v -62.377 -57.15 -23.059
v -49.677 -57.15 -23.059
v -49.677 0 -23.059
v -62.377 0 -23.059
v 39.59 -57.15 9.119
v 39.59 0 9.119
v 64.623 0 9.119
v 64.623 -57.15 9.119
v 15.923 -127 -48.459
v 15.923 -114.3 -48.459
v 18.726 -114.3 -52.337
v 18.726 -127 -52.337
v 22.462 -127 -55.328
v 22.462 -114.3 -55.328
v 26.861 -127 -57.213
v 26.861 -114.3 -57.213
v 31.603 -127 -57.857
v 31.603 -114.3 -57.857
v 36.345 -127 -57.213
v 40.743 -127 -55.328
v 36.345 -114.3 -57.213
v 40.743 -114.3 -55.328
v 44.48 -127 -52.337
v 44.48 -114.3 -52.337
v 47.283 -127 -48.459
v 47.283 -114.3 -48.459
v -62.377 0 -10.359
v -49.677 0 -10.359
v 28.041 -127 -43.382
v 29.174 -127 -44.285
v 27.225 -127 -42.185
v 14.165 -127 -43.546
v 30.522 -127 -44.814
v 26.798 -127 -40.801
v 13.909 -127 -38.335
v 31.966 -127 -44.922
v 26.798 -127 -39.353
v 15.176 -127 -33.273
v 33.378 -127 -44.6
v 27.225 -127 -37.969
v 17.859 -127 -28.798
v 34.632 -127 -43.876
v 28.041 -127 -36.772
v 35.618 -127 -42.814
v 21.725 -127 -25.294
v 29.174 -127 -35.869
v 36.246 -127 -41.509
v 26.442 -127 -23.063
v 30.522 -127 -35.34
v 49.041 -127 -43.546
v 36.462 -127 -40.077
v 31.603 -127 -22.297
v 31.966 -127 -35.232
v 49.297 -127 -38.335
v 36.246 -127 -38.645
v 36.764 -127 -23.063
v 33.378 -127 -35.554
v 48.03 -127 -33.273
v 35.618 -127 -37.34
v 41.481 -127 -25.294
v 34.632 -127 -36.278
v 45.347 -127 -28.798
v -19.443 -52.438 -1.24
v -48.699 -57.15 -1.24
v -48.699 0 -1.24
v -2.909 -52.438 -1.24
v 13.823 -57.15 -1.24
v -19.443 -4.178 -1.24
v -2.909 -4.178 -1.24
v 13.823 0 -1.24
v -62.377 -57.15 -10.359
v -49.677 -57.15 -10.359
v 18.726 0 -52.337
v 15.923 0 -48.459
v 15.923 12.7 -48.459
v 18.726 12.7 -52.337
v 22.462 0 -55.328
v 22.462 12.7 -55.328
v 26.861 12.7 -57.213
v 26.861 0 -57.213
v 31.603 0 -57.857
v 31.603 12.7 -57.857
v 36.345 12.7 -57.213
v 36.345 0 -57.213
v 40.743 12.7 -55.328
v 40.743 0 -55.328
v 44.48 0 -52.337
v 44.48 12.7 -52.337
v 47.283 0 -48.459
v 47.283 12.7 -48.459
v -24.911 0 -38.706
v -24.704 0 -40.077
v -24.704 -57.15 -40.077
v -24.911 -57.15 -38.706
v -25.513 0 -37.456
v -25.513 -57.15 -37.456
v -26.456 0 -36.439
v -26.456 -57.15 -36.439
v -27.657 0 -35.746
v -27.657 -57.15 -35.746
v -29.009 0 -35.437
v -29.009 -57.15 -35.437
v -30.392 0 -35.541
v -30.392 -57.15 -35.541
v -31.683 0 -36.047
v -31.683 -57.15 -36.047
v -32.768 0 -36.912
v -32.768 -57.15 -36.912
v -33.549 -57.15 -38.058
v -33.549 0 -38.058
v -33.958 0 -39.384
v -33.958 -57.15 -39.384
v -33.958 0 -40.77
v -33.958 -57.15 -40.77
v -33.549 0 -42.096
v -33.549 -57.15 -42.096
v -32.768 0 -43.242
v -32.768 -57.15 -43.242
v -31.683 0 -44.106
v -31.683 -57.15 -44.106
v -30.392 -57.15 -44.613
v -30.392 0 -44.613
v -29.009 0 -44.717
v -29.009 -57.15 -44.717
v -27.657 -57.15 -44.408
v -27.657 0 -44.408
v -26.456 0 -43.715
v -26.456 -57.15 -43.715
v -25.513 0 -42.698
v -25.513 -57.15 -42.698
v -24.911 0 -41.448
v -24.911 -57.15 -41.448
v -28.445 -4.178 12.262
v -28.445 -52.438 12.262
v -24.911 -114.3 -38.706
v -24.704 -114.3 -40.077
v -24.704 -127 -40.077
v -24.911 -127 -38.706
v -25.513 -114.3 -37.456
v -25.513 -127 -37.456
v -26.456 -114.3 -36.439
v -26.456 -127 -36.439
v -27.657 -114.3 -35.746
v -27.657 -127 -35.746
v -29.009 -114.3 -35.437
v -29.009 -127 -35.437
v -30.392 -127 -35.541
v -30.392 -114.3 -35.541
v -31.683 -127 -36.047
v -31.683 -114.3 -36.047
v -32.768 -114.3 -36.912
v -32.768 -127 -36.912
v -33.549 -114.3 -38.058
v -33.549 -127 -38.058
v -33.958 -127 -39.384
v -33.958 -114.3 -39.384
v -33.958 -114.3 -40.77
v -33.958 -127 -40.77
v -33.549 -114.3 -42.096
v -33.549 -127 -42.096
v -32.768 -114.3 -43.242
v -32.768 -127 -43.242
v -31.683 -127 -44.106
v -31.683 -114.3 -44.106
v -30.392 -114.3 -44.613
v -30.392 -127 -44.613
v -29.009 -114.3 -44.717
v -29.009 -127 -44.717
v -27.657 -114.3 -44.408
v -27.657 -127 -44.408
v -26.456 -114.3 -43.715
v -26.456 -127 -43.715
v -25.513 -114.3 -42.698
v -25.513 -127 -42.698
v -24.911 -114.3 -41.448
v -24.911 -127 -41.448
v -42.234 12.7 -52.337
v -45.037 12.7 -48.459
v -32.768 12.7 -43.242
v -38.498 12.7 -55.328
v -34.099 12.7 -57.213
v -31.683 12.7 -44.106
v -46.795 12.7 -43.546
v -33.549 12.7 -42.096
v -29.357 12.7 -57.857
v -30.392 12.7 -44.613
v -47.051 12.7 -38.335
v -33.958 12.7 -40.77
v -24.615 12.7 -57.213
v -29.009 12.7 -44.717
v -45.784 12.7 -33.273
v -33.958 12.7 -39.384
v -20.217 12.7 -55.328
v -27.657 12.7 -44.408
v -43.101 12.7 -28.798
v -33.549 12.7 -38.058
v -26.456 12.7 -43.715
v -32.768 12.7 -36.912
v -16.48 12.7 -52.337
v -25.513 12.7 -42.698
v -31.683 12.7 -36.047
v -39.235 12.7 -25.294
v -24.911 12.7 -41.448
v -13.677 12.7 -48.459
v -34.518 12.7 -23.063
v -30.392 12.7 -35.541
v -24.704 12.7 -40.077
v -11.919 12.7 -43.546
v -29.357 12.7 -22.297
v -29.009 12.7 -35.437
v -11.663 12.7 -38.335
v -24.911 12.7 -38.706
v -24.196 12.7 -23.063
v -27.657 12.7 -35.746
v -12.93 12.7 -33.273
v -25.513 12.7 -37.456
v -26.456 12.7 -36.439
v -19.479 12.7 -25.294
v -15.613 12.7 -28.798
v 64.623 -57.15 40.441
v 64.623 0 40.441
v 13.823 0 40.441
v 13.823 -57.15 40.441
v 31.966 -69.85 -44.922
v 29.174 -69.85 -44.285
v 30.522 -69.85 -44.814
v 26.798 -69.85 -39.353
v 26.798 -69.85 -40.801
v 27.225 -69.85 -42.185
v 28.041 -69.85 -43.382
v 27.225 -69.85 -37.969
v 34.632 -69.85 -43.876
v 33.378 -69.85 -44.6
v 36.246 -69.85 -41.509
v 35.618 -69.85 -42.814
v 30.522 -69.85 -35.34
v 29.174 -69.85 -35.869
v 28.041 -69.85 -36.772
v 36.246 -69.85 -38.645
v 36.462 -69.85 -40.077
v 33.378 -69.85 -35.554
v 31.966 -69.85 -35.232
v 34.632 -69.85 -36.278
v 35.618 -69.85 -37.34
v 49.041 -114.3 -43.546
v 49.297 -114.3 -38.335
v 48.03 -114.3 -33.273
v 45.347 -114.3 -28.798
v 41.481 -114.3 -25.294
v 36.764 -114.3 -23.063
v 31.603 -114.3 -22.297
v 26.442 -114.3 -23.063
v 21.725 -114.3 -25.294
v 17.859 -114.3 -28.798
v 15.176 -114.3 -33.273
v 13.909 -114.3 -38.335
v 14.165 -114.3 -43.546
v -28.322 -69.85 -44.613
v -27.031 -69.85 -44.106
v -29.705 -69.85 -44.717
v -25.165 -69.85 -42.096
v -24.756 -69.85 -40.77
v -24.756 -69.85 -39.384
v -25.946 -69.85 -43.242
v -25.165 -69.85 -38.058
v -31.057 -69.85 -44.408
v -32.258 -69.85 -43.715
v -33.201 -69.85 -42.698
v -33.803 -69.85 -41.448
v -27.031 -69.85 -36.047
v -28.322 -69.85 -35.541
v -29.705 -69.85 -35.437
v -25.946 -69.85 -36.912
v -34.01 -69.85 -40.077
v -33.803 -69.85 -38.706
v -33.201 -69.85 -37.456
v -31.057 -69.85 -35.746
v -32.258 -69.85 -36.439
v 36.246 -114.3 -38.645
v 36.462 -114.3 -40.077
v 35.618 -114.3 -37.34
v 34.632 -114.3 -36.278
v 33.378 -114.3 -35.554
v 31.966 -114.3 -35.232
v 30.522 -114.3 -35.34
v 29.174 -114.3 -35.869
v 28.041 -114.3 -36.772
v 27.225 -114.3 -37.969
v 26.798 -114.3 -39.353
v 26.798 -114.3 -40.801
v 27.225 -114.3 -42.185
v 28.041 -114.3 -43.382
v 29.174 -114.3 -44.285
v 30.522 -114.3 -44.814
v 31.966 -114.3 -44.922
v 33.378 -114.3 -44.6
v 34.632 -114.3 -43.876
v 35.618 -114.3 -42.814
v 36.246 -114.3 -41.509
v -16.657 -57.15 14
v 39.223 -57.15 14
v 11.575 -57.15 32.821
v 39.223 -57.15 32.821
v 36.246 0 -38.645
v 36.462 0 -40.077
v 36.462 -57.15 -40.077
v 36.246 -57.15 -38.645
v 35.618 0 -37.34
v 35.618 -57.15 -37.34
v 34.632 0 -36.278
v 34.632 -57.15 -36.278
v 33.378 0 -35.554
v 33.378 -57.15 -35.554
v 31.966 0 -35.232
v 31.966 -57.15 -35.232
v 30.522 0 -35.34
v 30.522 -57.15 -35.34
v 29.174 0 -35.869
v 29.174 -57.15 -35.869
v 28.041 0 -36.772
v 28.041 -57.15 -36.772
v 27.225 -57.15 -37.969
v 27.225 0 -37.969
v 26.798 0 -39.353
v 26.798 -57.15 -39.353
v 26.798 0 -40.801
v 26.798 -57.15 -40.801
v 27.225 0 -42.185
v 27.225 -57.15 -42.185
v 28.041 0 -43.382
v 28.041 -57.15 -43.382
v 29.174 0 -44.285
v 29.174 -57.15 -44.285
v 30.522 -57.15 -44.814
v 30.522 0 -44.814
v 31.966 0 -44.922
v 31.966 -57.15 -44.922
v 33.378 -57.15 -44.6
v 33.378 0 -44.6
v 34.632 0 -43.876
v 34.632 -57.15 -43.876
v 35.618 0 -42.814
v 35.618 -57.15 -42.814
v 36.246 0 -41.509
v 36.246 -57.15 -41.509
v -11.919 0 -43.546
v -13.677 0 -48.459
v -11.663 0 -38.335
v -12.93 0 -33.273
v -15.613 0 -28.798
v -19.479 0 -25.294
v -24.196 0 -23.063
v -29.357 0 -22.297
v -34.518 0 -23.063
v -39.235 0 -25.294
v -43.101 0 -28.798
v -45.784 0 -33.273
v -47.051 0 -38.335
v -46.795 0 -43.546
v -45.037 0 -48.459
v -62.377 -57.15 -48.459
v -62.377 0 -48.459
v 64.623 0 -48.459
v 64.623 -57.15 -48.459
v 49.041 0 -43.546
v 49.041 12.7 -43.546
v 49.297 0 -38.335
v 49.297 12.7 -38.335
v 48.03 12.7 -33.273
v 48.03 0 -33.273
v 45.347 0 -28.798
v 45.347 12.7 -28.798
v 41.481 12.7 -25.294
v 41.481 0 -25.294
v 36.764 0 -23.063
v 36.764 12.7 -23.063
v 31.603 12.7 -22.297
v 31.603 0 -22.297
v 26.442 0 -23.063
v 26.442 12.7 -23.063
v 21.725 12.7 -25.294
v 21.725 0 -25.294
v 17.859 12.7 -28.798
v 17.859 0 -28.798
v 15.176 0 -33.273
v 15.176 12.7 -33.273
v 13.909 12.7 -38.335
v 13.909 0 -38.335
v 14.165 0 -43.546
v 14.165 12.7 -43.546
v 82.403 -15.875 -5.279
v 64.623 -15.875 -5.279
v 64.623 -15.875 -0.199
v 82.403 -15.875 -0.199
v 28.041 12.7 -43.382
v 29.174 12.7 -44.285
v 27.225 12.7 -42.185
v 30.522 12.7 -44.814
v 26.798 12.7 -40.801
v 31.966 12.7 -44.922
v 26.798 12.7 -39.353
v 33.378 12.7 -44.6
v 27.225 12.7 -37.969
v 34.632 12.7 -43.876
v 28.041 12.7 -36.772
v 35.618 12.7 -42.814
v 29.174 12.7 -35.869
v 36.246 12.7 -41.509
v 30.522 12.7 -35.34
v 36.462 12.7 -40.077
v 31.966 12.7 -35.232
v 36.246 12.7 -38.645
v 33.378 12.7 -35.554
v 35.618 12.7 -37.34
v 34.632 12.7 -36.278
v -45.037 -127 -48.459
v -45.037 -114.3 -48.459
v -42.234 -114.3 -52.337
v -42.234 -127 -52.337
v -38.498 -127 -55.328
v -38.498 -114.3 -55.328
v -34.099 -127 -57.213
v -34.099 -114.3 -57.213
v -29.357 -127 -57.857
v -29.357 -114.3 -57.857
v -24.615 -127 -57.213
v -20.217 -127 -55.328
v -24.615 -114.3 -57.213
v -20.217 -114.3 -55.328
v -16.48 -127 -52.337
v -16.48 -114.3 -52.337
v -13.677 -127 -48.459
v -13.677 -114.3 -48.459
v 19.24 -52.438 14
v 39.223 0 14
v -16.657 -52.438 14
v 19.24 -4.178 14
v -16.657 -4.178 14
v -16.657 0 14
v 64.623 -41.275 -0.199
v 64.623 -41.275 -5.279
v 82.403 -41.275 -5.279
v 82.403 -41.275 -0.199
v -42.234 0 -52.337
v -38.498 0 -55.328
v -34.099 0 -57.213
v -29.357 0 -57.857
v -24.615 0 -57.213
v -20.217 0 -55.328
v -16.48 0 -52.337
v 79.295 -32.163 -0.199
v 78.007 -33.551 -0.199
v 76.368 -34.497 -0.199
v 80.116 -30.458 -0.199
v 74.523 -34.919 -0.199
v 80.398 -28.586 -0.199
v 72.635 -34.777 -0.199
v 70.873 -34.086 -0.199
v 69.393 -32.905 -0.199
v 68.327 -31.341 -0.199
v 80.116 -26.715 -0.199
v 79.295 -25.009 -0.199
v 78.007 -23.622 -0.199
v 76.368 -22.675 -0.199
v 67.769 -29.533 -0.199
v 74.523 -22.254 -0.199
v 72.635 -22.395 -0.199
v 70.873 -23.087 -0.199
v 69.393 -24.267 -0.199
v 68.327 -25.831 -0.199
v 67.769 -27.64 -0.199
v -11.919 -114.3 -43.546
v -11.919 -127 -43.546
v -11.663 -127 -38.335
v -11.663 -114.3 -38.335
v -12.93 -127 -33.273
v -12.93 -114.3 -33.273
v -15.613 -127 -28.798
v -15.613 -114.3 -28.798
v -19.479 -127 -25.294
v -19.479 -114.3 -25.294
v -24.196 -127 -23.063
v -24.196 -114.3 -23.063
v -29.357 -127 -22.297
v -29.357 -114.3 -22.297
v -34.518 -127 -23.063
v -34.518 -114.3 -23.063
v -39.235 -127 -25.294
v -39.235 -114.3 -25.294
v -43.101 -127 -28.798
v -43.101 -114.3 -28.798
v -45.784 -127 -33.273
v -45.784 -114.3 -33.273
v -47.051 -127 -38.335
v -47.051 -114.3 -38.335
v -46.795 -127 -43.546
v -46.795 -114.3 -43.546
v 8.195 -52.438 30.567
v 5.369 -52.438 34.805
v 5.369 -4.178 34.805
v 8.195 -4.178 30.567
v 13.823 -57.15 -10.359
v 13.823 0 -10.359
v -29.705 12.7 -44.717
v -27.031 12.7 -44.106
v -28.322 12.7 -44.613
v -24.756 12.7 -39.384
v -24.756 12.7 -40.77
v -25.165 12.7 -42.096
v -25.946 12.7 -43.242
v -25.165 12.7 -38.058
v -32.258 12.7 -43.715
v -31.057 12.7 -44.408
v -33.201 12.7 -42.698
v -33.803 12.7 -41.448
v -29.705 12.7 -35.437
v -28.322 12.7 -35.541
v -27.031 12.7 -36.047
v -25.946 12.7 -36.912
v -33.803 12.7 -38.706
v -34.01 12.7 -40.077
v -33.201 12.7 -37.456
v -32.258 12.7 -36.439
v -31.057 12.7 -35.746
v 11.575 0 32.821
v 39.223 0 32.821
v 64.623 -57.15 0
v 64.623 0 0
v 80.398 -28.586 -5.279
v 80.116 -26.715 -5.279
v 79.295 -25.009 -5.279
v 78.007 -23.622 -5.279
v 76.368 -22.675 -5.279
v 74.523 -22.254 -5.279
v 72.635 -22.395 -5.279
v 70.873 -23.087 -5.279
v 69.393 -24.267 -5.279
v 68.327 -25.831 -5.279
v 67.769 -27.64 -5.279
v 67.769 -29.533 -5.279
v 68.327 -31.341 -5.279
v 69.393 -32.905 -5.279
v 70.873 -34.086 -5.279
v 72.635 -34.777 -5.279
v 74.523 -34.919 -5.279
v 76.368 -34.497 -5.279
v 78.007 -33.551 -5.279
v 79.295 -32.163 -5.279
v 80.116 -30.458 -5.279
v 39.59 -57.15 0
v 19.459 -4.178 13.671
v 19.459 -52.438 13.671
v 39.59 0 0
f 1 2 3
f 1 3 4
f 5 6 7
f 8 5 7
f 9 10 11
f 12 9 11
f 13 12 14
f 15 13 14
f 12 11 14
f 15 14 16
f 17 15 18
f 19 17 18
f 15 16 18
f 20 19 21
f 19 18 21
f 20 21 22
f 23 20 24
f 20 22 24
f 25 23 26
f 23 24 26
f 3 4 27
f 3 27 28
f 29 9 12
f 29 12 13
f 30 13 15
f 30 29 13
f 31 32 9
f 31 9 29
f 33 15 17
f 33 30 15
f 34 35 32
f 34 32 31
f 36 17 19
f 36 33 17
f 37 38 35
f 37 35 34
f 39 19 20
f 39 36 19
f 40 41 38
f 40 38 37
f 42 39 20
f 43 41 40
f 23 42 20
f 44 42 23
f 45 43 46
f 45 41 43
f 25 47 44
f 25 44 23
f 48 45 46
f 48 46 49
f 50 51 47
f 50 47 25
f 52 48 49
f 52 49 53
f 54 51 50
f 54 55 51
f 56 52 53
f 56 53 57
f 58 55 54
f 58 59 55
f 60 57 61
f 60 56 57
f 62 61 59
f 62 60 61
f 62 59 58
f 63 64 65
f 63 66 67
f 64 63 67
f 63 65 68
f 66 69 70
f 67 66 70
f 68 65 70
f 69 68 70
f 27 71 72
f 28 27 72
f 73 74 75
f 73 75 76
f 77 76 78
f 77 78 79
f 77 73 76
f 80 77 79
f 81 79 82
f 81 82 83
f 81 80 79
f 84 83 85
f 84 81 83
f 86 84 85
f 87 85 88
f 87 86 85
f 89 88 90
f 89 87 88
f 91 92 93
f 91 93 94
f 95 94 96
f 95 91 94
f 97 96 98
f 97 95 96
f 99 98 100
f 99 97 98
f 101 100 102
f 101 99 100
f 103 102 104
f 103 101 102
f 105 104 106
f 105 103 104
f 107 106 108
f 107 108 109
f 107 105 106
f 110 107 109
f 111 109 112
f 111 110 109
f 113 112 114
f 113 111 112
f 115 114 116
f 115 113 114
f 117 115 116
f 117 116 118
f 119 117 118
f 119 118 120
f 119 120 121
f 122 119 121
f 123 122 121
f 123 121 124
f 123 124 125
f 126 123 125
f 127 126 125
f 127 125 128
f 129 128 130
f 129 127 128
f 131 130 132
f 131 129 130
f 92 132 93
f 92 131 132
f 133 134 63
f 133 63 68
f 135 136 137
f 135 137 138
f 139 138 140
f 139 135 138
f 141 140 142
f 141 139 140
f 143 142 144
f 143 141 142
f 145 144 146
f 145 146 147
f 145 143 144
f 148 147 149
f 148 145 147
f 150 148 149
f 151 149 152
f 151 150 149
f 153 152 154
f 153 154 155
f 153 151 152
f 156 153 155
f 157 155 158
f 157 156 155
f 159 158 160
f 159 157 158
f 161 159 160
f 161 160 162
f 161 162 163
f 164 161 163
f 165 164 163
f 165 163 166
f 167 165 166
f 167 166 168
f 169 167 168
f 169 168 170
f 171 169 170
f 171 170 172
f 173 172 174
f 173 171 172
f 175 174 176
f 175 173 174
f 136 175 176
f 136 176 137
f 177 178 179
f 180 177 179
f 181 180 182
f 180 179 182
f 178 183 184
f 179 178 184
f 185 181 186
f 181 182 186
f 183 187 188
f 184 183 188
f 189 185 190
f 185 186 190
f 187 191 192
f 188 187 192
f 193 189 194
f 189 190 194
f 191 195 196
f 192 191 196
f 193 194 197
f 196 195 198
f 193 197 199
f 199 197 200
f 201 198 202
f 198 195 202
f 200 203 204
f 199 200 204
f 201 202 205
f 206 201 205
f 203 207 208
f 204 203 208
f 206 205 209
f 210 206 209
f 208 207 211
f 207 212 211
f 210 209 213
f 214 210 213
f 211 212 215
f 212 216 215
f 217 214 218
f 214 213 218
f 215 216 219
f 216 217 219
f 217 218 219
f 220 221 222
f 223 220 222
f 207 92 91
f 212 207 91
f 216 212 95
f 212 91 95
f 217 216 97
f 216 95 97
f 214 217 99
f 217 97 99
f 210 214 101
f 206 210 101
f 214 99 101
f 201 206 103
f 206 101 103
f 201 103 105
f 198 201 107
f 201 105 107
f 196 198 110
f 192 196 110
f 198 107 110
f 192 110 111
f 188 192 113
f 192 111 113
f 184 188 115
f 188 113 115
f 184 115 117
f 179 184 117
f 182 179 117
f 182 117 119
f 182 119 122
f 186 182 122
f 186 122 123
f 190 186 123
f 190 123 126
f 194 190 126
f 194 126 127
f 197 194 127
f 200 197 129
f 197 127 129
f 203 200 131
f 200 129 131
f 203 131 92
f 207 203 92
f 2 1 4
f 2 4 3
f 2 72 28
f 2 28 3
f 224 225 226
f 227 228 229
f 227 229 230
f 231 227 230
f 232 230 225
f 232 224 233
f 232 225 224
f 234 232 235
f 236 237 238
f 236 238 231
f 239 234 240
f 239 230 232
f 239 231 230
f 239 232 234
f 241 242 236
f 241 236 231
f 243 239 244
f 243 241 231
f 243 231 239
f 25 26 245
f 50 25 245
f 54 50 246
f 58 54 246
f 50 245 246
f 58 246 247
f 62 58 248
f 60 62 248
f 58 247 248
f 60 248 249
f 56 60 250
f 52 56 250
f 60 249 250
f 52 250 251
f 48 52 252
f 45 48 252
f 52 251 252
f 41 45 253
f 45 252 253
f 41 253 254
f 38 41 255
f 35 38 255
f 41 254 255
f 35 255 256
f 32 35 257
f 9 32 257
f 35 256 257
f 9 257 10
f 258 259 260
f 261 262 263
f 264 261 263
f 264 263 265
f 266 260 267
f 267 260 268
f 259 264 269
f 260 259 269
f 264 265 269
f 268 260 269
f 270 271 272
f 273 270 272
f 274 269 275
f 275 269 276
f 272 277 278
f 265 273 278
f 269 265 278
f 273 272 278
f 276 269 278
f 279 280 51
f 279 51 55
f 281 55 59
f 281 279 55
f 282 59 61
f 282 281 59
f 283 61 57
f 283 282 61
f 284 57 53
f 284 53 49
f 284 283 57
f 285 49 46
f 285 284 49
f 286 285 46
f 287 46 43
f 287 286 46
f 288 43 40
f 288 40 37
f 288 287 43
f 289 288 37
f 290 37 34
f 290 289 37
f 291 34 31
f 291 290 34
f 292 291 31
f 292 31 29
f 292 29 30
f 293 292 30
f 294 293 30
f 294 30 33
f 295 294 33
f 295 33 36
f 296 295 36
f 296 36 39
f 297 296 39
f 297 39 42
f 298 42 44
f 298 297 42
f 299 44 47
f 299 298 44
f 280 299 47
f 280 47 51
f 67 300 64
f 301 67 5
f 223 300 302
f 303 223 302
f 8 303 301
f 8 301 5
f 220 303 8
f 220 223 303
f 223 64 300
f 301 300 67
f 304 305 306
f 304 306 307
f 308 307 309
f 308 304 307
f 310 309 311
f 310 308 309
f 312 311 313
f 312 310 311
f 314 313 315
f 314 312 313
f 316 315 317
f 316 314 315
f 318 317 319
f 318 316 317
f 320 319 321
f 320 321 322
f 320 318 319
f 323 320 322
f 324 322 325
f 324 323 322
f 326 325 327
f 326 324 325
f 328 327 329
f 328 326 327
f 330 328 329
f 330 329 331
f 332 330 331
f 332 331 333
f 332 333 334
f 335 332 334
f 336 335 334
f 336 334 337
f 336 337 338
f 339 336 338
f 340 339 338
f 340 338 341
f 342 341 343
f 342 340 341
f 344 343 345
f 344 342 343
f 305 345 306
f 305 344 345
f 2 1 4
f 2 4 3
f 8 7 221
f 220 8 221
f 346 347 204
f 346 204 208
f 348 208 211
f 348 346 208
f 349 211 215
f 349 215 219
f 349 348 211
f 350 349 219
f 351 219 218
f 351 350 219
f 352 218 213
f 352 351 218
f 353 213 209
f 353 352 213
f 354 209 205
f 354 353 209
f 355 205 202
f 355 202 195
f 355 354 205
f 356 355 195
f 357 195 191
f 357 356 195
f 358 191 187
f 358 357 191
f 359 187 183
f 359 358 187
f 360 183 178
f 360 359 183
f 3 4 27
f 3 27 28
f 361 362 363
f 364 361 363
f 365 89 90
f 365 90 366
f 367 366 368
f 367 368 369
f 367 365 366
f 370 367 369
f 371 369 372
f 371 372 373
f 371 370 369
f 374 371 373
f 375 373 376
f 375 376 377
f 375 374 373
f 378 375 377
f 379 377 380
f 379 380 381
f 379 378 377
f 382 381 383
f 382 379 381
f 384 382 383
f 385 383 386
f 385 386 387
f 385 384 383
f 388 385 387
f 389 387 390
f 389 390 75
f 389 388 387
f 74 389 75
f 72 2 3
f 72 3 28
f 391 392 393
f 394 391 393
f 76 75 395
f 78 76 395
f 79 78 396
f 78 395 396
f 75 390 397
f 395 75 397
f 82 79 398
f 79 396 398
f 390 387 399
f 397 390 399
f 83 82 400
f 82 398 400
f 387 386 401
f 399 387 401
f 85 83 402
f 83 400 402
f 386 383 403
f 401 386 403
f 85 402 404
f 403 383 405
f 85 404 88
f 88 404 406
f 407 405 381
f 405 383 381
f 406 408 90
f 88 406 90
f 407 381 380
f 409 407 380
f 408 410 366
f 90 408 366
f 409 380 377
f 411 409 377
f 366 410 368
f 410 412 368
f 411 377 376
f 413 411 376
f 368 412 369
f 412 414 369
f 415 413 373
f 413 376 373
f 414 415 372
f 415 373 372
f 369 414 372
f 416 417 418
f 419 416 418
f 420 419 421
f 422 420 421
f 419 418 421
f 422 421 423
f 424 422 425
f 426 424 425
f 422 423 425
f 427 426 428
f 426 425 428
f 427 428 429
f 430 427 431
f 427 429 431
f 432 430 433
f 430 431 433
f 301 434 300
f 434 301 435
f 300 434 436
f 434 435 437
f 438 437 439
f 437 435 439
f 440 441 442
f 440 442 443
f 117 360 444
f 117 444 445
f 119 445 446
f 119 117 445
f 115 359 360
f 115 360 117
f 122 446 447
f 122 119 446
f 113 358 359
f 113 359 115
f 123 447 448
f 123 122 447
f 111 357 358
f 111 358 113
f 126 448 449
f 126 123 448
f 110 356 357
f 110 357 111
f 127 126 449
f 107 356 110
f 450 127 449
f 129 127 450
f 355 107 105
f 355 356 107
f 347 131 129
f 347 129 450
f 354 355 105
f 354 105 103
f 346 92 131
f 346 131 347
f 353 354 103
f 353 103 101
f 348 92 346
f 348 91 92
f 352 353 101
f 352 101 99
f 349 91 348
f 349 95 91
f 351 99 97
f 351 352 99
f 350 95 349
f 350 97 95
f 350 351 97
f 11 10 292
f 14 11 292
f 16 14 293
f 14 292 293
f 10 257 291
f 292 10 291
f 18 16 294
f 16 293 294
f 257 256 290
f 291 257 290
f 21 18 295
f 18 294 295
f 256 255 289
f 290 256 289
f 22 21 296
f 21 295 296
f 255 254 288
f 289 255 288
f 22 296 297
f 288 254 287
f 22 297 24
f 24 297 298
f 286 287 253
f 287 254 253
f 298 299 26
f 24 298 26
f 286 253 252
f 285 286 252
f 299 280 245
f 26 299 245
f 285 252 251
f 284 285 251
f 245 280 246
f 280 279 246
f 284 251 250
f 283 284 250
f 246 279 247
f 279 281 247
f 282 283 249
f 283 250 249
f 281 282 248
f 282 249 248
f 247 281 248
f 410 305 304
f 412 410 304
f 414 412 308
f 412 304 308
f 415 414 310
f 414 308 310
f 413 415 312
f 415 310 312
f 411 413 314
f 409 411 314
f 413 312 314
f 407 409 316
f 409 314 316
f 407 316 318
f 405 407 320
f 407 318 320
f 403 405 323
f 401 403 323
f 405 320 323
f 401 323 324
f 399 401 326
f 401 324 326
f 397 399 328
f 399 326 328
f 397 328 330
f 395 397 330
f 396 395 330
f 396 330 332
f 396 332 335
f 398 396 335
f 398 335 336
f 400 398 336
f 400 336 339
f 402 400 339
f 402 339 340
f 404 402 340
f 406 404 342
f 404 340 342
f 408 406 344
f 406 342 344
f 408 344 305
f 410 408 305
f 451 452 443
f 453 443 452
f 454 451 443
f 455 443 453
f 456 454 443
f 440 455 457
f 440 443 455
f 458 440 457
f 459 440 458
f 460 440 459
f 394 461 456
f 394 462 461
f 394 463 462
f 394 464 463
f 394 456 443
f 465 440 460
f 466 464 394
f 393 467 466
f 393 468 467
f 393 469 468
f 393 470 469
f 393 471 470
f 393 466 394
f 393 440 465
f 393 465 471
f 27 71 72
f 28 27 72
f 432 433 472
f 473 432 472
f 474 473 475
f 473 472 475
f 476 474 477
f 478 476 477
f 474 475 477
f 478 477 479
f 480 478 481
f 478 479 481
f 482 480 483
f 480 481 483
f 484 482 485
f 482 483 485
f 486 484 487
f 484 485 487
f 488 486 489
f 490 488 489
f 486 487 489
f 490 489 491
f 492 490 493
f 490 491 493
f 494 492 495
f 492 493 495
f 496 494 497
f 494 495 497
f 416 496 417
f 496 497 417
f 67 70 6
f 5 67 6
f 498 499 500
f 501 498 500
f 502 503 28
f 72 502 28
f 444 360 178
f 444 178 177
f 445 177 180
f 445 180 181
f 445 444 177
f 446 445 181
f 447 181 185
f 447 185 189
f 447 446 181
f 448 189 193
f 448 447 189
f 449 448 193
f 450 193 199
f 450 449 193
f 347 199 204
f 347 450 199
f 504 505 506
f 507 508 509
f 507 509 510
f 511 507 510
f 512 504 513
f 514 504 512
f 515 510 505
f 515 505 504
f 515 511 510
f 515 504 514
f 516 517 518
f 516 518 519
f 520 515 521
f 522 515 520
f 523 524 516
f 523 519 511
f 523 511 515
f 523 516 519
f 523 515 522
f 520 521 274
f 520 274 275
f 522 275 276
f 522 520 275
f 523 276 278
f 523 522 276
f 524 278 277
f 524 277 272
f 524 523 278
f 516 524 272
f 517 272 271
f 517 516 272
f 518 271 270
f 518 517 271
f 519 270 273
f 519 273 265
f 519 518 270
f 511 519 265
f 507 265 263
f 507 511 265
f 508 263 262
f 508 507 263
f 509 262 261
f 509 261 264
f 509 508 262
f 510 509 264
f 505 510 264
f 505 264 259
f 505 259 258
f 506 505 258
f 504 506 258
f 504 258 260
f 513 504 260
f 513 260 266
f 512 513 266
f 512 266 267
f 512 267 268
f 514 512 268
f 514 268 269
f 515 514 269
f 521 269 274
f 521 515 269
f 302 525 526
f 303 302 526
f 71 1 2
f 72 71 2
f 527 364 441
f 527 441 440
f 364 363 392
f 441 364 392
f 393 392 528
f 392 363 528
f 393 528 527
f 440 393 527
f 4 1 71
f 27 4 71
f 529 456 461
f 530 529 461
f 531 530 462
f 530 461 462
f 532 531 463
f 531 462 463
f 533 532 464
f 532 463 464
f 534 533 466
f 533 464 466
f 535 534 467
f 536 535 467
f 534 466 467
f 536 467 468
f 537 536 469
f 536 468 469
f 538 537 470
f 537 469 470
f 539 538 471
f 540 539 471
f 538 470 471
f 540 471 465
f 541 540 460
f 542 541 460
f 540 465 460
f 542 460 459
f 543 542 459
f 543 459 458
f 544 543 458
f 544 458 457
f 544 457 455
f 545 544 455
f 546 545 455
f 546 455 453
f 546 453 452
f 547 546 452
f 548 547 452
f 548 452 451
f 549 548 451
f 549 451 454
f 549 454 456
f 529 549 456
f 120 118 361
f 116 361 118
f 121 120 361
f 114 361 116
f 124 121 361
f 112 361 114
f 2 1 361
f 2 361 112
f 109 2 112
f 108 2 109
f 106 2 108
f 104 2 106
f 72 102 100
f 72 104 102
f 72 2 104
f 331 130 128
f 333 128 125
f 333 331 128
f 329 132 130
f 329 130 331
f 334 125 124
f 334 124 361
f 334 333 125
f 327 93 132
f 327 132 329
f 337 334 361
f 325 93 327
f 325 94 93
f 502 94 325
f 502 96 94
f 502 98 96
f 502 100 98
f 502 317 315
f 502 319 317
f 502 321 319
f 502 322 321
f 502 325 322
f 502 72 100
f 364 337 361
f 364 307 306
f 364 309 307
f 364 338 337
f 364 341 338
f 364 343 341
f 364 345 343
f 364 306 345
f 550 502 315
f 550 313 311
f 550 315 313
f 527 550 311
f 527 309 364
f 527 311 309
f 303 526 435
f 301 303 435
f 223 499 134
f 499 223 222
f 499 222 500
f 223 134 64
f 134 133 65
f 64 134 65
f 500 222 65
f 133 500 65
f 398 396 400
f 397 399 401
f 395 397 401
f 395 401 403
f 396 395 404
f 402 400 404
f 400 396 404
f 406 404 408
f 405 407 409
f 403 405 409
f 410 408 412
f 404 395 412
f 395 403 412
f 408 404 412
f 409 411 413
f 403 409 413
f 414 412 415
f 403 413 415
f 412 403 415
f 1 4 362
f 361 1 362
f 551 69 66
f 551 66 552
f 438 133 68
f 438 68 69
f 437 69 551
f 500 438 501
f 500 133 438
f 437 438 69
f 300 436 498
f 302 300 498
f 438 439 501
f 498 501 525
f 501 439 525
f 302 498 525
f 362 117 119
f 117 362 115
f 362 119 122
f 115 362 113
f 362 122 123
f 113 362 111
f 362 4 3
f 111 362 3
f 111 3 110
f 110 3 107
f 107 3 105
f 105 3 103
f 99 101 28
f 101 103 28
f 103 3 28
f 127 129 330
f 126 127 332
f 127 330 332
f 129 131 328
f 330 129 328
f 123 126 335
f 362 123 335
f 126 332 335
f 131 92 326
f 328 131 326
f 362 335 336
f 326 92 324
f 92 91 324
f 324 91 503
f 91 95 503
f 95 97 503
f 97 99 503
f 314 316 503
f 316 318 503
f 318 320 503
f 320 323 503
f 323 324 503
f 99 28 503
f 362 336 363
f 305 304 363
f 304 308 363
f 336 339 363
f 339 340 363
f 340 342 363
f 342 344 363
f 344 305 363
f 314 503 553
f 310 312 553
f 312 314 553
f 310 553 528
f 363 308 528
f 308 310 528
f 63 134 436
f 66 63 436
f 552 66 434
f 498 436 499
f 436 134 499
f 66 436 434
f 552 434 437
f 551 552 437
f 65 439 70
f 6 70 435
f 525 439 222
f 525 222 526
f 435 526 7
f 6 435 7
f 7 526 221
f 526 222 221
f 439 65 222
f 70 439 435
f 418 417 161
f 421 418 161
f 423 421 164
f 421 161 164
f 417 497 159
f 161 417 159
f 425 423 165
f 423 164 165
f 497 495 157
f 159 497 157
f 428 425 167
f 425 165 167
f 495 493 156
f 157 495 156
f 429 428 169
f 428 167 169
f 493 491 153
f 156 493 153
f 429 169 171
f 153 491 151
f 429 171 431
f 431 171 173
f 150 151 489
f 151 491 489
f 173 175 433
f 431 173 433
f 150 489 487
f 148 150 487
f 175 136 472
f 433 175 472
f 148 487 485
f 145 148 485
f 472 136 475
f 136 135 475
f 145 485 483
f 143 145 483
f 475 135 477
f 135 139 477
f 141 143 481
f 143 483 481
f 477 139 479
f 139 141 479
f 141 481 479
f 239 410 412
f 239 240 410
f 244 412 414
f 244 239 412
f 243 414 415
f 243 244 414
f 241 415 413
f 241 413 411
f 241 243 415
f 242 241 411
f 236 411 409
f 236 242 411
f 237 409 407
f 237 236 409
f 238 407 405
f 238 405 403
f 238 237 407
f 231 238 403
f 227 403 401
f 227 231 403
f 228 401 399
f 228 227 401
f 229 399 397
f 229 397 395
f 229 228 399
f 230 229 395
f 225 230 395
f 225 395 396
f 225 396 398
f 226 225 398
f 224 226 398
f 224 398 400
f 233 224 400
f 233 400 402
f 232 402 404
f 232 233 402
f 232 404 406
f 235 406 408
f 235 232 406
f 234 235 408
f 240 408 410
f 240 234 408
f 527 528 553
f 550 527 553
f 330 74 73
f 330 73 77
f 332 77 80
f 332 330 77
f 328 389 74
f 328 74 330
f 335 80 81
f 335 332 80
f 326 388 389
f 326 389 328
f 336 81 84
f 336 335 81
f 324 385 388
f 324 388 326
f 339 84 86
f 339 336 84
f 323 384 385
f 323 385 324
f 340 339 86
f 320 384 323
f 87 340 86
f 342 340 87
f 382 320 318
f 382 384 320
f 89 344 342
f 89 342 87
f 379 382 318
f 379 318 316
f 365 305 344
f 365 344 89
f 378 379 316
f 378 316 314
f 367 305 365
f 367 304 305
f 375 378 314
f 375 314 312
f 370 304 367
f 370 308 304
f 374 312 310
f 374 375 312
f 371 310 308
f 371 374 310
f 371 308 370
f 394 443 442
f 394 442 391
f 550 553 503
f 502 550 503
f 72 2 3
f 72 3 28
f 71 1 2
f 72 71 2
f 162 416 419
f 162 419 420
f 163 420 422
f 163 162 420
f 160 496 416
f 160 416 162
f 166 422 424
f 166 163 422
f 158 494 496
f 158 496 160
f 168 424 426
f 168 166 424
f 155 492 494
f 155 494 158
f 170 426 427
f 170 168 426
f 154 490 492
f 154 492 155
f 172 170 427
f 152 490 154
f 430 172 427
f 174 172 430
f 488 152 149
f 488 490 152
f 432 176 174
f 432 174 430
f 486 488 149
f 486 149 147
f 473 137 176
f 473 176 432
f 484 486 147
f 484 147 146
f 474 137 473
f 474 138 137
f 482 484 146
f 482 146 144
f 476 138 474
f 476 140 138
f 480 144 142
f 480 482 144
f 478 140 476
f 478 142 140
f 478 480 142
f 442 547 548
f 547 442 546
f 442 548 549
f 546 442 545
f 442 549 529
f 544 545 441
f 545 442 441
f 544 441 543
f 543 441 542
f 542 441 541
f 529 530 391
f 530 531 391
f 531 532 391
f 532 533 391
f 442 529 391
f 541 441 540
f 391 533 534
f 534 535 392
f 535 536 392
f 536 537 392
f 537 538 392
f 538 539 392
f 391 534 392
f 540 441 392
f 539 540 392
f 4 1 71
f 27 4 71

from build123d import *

# Parameters (mm, degrees)
F1_DEPTH       = 57.15
F0_R           = 4.6528750416
F0_R_2         = 4.8589048732
F0_W           = 12.7
F0_H           = 12.7
F2_DEPTH       = 57.15
F3_DEPTH       = 57.15
F4_DEPTH       = 12.7
F6_W           = 40.64
F6_H           = 48.26
F7_DEPTH       = 25.4
F8_W           = 25.4
F8_H           = 5.08
F9_DEPTH       = 17.78
F10_R          = 6.35
F11_DEPTH      = 25.4
F12_R          = 4.6528736
F13_DEPTH      = 82.55
F14_DEPTH      = 69.85
F14_DEPTH_BACK = 12.7


# Not quite as in the source:
# - a feature names something its author has since deleted; it is built from what else it names


with BuildPart() as f1:
    # F0 (on Front) → F1 (new body)
    with BuildSketch(Plane.XZ):
        Polygon((64.6229624206, 40.4410248846), (13.8229624206, 40.4410248846), (-48.6991375794, -1.2403751154), (13.8229624206, -1.2403751154), (39.5902469754, 9.1186), (64.6229624206, 9.1186), align=None)
        Polygon((39.2229624206, 32.8210248846), (39.2229624206, 13.9996248846), (-16.6570375794, 13.9996248846), (11.5750624206, 32.8210248846), align=None, mode=Mode.SUBTRACT)
    extrude(amount=F1_DEPTH)

    # F6 (on face) → F7 (cut)
    with BuildSketch(Plane(origin=(-14.4118692019, 0, 21.6178038029), x_dir=(0.8320502943, 0, 0.5547001962), z_dir=(-0.5547001962, 0, 0.8320502943))):
        with Locations((3.4540443897, -28.3083)):
            Rectangle(F6_W, F6_H)
    extrude(amount=-F7_DEPTH, mode=Mode.SUBTRACT)


with BuildPart() as f1b:
    # F0 (on Front) → F1, piece 2 (new body)
    with BuildSketch(Plane.XZ):
        with BuildLine():
            Line((64.6229624206, -48.4589751154), (64.6229624206, 0))
            Line((64.6229624206, 0), (39.5902469754, 0))
            Line((39.5902469754, 0), (13.8229624206, -10.3589751154))
            Line((13.8229624206, -10.3589751154), (-49.6770375794, -10.3589751154))
            Line((-49.6770375794, -10.3589751154), (-49.6770375794, -23.0589751154))
            Line((-49.6770375794, -23.0589751154), (-62.3770375794, -23.0589751154))
            Line((-62.3770375794, -23.0589751154), (-62.3770375794, -48.4589751154))
            Line((-62.3770375794, -48.4589751154), (-45.0372951028, -48.4589751154))
            ThreePointArc((-45.0372951028, -48.4589751154), (-33.6775364646, -22.8298974098), (-11.5770375794, -40.0769751154))
            ThreePointArc((-11.5770375794, -40.0769751154), (-12.1099598738, -44.3974740006), (-13.676780056, -48.4589751154))
            Line((-13.676780056, -48.4589751154), (15.9227048972, -48.4589751154))
            ThreePointArc((15.9227048972, -48.4589751154), (27.2824635354, -22.8298974098), (49.3829624206, -40.0769751154))
            ThreePointArc((49.3829624206, -40.0769751154), (48.8500401262, -44.3974740006), (47.283219944, -48.4589751154))
            Line((47.283219944, -48.4589751154), (64.6229624206, -48.4589751154))
        make_face()
        with BuildLine():
            ThreePointArc((-11.5770375794, -40.0769751154), (-33.6775364646, -22.8298974098), (-45.0372951028, -48.4589751154))
            Line((-45.0372951028, -48.4589751154), (-13.676780056, -48.4589751154))
            ThreePointArc((-13.676780056, -48.4589751154), (-12.1099598738, -44.3974740006), (-11.5770375794, -40.0769751154))
        make_face()
        with Locations((-29.3570375794, -40.0769751154)):
            Circle(F0_R, mode=Mode.SUBTRACT)
        with BuildLine():
            Line((15.9227048972, -48.4589751154), (47.283219944, -48.4589751154))
            ThreePointArc((47.283219944, -48.4589751154), (48.8500401262, -44.3974740006), (49.3829624206, -40.0769751154))
            ThreePointArc((49.3829624206, -40.0769751154), (27.2824635354, -22.8298974098), (15.9227048972, -48.4589751154))
        make_face()
        with Locations((31.6029624206, -40.0769751154)):
            Circle(F0_R_2, mode=Mode.SUBTRACT)
    extrude(amount=F1_DEPTH)

    # F8 (on face) → F9 (join)
    with BuildSketch(Plane.YZ.offset(64.6229624206)):
        with Locations((-28.575, -2.7389751154)):
            Rectangle(F8_W, F8_H)
    extrude(amount=F9_DEPTH)

    # F10 (on face) → F11 (cut)
    with BuildSketch(Plane.XY.offset(-0.1989751154)):
        with Locations((74.0482390532, -28.5862853714)):
            Circle(F10_R)
    extrude(amount=-F11_DEPTH, mode=Mode.SUBTRACT)


with BuildPart() as f2:
    # F0 (on Front) → F2 (new body)
    with BuildSketch(Plane.XZ):
        with Locations((-56.0270375794, -16.7089751154)):
            Rectangle(F0_W, F0_H)
    extrude(amount=F2_DEPTH)


with BuildPart() as f3:
    # F0 (on Front) → F3 (new body)
    with BuildSketch(Plane.XZ):
        with Locations((-56.0270375794, -16.7089751154)):
            Rectangle(F0_W, F0_H)
    extrude(amount=F3_DEPTH)


with BuildPart() as f4:
    # F0 (on Front) → F4 (new body)
    with BuildSketch(Plane.XZ):
        with BuildLine():
            ThreePointArc((-11.5770375794, -40.0769751154), (-33.6775364646, -22.8298974098), (-45.0372951028, -48.4589751154))
            Line((-45.0372951028, -48.4589751154), (-13.676780056, -48.4589751154))
            ThreePointArc((-13.676780056, -48.4589751154), (-12.1099598738, -44.3974740006), (-11.5770375794, -40.0769751154))
        make_face()
        with Locations((-29.3570375794, -40.0769751154)):
            Circle(F0_R, mode=Mode.SUBTRACT)
        with BuildLine():
            Line((-13.676780056, -48.4589751154), (-45.0372951028, -48.4589751154))
            ThreePointArc((-45.0372951028, -48.4589751154), (-29.3570375794, -57.8569751154), (-13.676780056, -48.4589751154))
        make_face()
    extrude(amount=-F4_DEPTH)


with BuildPart() as f4b:
    # F0 (on Front) → F4, piece 2 (new body)
    with BuildSketch(Plane.XZ):
        with BuildLine():
            Line((15.9227048972, -48.4589751154), (47.283219944, -48.4589751154))
            ThreePointArc((47.283219944, -48.4589751154), (48.8500401262, -44.3974740006), (49.3829624206, -40.0769751154))
            ThreePointArc((49.3829624206, -40.0769751154), (27.2824635354, -22.8298974098), (15.9227048972, -48.4589751154))
        make_face()
        with Locations((31.6029624206, -40.0769751154)):
            Circle(F0_R_2, mode=Mode.SUBTRACT)
        with BuildLine():
            ThreePointArc((15.9227048972, -48.4589751154), (31.6029624206, -57.8569751154), (47.283219944, -48.4589751154))
            Line((47.283219944, -48.4589751154), (15.9227048972, -48.4589751154))
        make_face()
    extrude(amount=-F4_DEPTH)


with BuildPart() as f5_1:
    # F5: instance of F4b
    add(f4b.part.mirror(Plane(origin=(6.4473087682, -57.15, -27.6324476471), x_dir=(1, 0, 0), z_dir=(0, -1, 0))))


with BuildPart() as f5_2:
    # F5: instance of F4
    add(f4.part.mirror(Plane(origin=(6.4473087682, -57.15, -27.6324476471), x_dir=(1, 0, 0), z_dir=(0, -1, 0))))


with BuildPart() as f13:
    # F12 (on face) → F13 (new body)
    with BuildSketch(Plane(origin=(0, 12.7, 0), x_dir=(-1, 0, 0), z_dir=(0, 1, 0))):
        with Locations((29.3570375794, -40.0769751154)):
            Circle(F12_R)
    extrude(amount=-F13_DEPTH)


with BuildPart() as f14:
    # F0 (on Front) → F14 (new body, two sides)
    with BuildSketch(Plane.XZ) as f14_sk:
        with Locations((31.6029624206, -40.0769751154)):
            Circle(F0_R_2)
    extrude(amount=F14_DEPTH)
    extrude(f14_sk.sketch, amount=-F14_DEPTH_BACK)


solid = Compound([f1.part, f1b.part, f2.part, f3.part, f4.part, f4b.part, f5_1.part, f5_2.part, f13.part, f14.part])
